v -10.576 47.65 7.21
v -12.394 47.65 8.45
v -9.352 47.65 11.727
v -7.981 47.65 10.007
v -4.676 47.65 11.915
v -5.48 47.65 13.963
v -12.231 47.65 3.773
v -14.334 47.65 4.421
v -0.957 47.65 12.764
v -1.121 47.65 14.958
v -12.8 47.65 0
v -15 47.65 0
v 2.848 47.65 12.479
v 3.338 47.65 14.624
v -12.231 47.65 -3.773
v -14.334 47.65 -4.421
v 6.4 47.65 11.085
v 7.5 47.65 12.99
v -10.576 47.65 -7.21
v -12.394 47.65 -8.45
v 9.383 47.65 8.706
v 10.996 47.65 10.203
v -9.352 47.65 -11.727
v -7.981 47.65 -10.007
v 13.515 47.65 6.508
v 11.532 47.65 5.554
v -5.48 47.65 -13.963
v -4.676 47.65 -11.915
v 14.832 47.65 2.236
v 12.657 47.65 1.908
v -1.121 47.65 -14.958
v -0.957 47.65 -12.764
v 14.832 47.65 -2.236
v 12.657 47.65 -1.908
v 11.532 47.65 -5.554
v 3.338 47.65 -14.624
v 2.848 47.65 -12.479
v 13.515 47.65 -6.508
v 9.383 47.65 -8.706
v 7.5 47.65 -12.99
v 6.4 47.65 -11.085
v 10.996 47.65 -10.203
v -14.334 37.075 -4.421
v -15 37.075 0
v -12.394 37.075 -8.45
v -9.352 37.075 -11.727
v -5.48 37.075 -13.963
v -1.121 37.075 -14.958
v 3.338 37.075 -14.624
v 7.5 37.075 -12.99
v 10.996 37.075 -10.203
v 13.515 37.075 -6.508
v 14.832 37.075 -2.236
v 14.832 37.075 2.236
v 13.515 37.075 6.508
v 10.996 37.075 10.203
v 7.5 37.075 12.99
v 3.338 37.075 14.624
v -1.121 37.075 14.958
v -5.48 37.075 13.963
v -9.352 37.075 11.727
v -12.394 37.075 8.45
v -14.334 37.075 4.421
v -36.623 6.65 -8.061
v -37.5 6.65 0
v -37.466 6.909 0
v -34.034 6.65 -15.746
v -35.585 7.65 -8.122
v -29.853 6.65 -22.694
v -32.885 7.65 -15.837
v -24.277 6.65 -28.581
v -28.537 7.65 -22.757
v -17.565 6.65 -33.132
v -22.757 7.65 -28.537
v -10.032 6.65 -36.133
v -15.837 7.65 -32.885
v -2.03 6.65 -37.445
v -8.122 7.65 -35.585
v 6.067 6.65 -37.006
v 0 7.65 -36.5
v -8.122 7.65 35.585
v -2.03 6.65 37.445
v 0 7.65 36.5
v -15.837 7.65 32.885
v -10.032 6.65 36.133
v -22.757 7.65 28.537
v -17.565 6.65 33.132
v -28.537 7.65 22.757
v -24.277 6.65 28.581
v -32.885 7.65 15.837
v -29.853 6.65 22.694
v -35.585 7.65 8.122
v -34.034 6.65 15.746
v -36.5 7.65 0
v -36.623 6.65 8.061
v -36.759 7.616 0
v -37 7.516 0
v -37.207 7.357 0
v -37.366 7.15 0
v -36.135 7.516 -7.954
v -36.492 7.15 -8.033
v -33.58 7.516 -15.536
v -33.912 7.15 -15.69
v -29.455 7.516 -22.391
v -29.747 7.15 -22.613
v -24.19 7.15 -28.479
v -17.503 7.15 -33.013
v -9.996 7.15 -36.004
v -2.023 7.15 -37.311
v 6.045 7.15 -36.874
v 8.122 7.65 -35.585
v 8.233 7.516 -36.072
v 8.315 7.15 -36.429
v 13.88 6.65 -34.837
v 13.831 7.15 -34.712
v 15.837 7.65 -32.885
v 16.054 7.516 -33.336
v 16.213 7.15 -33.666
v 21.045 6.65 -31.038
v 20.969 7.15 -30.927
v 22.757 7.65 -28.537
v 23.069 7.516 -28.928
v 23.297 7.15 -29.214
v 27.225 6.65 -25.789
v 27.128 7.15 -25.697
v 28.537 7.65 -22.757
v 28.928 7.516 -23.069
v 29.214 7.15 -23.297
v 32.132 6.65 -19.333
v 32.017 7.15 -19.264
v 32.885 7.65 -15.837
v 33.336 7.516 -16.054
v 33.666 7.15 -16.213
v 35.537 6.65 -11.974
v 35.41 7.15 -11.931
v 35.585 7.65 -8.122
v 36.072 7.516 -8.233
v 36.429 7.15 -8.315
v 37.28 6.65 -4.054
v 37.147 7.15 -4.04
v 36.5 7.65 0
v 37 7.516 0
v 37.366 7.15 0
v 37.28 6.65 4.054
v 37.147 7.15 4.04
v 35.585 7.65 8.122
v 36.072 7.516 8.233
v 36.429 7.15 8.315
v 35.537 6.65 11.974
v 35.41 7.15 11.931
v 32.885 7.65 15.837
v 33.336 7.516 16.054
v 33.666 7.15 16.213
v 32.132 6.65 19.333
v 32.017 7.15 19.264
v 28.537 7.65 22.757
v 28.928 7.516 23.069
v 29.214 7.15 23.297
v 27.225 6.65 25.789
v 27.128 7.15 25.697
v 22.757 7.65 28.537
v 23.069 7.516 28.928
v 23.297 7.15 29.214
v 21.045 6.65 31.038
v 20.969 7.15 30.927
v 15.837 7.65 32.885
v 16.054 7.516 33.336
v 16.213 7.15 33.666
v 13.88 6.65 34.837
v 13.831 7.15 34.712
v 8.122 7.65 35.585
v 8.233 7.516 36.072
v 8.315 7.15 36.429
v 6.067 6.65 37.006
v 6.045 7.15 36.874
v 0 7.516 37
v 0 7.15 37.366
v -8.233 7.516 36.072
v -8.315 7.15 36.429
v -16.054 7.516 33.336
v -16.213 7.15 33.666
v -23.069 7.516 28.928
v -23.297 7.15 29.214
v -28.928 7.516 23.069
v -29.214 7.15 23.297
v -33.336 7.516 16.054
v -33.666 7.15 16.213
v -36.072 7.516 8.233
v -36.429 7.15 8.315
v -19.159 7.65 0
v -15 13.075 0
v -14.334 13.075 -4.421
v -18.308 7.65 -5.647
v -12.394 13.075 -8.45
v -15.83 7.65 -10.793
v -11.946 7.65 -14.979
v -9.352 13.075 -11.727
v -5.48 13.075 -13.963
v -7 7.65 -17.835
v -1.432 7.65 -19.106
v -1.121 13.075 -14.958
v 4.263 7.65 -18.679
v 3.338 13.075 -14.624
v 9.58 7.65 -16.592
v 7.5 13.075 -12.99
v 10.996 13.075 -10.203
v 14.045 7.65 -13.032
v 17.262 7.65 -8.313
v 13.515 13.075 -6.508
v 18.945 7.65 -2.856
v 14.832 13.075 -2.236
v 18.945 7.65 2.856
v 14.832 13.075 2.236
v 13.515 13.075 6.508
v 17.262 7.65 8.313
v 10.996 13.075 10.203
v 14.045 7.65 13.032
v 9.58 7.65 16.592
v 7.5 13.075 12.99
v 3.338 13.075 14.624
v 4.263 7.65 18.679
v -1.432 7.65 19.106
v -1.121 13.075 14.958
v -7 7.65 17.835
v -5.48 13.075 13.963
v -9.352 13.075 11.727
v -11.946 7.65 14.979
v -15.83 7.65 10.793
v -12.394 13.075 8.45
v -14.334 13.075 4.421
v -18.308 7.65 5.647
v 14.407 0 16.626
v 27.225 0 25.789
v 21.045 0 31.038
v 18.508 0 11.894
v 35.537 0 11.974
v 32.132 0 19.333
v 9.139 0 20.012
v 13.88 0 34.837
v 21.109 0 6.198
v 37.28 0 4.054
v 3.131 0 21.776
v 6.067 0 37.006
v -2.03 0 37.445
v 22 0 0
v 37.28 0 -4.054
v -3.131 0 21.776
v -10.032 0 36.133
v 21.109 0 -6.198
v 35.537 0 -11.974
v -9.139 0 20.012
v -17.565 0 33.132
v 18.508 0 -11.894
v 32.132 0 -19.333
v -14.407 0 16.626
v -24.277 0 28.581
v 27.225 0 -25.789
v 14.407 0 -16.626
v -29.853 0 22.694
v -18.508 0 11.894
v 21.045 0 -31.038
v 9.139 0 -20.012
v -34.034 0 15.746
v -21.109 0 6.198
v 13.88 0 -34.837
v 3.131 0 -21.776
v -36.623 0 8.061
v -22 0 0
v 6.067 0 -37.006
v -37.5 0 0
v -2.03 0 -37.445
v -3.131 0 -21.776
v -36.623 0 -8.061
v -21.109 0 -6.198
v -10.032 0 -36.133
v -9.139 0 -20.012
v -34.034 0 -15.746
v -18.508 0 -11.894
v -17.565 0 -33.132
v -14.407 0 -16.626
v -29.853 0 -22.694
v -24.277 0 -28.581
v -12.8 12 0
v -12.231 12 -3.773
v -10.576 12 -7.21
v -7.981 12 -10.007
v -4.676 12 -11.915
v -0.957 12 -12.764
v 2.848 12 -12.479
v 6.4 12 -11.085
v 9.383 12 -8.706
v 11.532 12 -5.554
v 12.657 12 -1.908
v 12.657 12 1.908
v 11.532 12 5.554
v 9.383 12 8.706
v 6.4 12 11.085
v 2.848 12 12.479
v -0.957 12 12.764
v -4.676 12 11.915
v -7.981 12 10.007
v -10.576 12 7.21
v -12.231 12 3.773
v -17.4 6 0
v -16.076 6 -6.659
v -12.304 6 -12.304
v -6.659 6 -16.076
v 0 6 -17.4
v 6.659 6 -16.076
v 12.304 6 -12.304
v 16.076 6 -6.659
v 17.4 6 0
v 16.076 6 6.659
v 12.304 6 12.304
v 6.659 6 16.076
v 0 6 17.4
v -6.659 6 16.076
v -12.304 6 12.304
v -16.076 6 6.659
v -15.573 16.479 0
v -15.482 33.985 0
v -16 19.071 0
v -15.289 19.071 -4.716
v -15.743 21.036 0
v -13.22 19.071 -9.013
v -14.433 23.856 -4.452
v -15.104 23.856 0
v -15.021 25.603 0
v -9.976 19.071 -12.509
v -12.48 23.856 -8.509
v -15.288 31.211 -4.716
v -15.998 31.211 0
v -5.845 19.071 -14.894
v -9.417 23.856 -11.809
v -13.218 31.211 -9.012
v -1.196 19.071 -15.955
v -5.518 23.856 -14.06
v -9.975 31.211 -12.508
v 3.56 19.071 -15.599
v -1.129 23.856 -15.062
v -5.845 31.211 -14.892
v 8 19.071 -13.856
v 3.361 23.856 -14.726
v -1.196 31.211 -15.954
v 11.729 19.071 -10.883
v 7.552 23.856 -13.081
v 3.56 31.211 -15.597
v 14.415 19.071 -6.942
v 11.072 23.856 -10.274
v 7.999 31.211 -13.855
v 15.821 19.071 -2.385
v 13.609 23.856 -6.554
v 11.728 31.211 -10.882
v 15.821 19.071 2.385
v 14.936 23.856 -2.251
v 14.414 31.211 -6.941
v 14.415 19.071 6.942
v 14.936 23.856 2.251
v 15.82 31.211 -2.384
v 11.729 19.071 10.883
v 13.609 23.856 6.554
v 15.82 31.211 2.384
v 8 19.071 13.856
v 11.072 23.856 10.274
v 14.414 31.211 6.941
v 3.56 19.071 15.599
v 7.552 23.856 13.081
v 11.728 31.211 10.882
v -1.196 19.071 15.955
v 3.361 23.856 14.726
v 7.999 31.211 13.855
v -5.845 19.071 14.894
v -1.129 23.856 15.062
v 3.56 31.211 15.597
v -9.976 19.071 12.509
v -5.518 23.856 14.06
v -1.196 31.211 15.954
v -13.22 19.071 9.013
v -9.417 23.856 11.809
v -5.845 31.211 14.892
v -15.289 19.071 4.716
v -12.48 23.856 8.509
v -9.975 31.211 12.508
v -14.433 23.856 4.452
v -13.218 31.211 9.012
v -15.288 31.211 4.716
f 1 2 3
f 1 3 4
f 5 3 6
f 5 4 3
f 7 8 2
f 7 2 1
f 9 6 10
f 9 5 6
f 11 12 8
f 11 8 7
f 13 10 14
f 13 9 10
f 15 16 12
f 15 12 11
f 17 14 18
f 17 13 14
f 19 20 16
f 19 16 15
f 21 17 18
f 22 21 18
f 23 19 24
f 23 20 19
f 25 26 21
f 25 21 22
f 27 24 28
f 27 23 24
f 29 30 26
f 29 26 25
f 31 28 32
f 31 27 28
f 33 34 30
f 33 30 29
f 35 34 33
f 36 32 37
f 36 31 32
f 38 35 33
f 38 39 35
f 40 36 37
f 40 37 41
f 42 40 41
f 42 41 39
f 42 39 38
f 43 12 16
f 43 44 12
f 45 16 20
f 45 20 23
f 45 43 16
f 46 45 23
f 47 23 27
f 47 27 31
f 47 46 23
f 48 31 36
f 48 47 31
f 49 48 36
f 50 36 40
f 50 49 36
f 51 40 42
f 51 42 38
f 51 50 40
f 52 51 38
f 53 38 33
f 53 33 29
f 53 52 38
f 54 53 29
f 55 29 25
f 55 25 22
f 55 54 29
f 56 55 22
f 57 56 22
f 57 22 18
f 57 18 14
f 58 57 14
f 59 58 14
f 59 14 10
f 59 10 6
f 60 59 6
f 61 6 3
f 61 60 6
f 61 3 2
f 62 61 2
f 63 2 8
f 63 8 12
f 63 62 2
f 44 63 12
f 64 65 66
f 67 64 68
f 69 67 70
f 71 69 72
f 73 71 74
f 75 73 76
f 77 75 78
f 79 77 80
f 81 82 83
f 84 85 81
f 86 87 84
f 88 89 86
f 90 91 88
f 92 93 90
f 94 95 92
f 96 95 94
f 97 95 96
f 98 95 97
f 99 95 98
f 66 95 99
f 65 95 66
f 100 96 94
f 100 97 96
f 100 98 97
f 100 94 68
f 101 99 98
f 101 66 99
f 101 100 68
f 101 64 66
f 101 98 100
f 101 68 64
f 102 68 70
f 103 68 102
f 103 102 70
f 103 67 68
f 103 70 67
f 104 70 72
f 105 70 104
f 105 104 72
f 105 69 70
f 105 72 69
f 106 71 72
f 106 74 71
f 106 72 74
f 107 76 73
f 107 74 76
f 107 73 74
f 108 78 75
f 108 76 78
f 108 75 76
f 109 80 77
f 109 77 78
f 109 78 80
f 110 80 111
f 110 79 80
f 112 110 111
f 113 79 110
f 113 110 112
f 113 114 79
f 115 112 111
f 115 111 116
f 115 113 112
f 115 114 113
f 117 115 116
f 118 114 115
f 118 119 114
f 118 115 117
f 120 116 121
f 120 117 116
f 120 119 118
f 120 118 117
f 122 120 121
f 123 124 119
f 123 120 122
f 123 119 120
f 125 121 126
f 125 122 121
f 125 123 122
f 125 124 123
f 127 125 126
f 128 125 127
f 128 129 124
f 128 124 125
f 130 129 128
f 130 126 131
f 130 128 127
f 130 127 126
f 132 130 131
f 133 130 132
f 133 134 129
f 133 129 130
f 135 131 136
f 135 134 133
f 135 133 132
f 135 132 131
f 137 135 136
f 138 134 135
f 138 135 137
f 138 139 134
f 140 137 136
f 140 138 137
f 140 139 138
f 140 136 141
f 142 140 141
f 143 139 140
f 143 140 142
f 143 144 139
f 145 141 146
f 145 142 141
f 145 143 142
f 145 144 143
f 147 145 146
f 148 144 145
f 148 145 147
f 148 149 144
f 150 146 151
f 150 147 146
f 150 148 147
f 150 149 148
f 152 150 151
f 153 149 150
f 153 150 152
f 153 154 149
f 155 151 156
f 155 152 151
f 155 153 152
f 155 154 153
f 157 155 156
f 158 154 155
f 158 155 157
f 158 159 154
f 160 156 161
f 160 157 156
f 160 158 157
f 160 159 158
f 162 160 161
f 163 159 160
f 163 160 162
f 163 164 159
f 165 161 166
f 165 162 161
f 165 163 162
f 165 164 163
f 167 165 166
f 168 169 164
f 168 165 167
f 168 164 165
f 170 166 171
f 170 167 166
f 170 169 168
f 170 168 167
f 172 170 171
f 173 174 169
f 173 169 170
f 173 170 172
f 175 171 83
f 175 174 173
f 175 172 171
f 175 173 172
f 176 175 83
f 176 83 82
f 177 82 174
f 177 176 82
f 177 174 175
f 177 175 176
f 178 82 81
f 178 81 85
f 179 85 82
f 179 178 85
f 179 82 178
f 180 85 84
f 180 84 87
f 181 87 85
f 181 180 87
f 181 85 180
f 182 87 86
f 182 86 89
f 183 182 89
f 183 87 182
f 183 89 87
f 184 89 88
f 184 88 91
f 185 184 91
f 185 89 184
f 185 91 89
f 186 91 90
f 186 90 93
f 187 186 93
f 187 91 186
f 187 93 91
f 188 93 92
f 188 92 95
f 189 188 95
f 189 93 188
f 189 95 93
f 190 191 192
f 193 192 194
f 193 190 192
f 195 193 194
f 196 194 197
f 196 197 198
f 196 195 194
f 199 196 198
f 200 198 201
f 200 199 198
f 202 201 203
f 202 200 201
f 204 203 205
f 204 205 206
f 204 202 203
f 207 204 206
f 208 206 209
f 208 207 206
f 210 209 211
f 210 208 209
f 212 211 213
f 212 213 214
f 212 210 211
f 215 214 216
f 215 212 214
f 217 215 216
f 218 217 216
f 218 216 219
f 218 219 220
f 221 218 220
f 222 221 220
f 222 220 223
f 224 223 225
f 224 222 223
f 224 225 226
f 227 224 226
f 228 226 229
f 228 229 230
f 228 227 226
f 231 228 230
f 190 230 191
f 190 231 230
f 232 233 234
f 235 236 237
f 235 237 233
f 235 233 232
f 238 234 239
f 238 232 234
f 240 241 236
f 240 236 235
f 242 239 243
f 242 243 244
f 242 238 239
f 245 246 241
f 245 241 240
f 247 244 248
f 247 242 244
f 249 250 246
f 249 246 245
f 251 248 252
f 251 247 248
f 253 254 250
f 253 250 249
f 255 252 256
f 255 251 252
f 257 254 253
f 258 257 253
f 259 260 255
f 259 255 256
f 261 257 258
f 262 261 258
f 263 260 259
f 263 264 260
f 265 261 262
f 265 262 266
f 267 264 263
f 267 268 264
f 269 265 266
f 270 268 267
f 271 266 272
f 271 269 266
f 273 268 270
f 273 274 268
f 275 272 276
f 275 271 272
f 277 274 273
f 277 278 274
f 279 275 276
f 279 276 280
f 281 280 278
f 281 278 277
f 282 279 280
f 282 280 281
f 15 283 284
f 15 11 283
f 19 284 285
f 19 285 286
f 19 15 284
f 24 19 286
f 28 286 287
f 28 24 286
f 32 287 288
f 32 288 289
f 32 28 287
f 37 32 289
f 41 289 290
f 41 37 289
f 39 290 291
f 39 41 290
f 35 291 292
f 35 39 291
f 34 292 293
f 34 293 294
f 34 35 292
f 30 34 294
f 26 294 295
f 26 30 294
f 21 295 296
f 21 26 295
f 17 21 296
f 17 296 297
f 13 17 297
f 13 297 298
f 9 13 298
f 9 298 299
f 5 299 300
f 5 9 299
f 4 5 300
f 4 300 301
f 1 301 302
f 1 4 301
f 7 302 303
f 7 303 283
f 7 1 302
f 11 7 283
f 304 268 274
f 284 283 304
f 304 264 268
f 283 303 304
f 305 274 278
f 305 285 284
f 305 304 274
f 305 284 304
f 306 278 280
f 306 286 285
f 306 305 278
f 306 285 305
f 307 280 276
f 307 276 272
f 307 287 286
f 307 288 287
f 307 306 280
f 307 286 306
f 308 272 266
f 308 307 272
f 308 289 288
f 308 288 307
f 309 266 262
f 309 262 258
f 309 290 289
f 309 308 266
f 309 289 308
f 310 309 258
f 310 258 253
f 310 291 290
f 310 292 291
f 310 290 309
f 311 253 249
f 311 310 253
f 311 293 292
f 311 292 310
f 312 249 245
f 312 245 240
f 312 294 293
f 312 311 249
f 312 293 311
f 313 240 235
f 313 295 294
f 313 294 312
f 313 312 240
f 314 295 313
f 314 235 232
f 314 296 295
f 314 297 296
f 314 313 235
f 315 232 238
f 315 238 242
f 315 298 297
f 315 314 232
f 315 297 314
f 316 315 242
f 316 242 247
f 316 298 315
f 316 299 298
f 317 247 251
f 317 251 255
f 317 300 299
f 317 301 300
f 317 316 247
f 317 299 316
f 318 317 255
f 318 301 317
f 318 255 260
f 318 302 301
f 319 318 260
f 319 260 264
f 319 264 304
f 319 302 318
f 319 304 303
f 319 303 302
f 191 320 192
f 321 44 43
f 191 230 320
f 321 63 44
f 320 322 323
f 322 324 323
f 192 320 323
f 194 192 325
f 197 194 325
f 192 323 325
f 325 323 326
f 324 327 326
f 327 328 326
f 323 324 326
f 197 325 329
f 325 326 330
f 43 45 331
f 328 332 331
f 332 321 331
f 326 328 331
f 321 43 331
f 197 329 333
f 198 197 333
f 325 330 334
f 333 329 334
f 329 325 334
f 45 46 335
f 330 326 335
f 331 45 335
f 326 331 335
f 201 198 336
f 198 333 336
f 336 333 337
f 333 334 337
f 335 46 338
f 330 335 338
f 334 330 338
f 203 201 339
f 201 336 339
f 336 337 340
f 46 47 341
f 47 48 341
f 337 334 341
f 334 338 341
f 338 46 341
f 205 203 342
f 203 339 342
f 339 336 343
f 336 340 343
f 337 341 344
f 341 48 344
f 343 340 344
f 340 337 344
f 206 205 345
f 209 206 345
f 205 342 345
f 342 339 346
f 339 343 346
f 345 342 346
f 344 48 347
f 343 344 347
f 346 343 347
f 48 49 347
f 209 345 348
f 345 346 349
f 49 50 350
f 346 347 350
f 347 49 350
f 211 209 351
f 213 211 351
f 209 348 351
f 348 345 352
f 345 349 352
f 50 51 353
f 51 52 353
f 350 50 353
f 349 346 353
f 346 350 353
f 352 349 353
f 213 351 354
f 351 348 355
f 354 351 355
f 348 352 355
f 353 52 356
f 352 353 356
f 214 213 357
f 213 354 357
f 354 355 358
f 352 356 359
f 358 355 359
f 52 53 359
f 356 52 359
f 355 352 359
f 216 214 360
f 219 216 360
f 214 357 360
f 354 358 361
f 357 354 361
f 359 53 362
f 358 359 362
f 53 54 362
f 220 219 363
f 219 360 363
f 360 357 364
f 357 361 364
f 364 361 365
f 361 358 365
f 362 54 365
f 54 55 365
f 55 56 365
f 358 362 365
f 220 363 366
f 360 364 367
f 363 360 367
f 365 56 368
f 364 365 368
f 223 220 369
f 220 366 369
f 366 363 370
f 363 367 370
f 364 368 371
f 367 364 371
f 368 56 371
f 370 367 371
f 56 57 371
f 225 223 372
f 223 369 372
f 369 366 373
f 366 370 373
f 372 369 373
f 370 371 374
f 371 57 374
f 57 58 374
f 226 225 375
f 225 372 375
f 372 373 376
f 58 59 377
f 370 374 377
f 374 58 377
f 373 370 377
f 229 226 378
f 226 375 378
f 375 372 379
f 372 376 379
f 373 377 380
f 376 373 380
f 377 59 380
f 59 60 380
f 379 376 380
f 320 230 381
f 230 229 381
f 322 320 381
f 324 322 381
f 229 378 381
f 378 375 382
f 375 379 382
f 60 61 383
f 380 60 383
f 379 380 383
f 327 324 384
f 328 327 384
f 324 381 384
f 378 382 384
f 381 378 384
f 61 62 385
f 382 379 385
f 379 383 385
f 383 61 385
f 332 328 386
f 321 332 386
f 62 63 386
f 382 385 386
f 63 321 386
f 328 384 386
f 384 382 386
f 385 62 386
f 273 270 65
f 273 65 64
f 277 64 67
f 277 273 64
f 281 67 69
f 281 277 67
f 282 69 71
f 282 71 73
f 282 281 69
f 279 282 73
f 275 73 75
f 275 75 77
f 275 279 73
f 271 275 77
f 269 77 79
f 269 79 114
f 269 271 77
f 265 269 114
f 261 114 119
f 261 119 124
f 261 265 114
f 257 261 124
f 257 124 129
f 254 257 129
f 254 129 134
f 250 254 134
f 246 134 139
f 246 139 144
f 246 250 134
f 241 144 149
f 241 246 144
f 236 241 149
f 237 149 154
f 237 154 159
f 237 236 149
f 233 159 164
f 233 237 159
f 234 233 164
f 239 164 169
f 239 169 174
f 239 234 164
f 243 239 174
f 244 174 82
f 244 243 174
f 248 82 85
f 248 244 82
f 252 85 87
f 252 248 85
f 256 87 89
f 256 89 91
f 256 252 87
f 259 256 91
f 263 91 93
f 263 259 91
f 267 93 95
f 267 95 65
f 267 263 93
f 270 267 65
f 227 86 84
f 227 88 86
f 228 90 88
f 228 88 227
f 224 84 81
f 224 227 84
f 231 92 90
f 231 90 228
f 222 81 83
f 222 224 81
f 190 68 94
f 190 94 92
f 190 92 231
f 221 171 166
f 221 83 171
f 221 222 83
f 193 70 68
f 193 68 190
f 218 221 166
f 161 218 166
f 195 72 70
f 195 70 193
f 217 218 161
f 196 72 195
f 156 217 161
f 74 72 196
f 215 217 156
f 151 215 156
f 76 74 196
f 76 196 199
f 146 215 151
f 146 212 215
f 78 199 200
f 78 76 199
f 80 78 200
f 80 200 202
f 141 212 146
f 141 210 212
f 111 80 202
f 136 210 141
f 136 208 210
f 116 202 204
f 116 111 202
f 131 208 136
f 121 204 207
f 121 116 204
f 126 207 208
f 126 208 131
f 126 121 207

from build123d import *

# Parameters (mm, degrees)
F2_R = 1


with BuildPart() as f1:
    # F0 (on Top) → F1 (revolve)
    with BuildSketch(Plane.XY):
        with BuildLine():
            Line((-37.5, 0), (-22, 0))
            Line((-22, 0), (-12.8, 12))
            Line((-12.8, 12), (-12.8, 47.65))
            Line((-12.8, 47.65), (-15, 47.65))
            Line((-15, 47.65), (-15, 37.075003))
            add(Edge.make_bspline(
                [(-15, 13.075003), (-14.989024, 15.277), (-17.005096, 18.993094), (-13.998628, 25.058692), (-17.000392, 31.222159), (-15, 34.742516), (-15, 37.075003)],
                knots=[0, 0, 0, 0, 6.082763, 12.165525, 18.248288, 24.33105, 24.33105, 24.33105, 24.33105], degree=3))
            Line((-15, 13.075003), (-19.159169, 7.65))
            Line((-19.159169, 7.65), (-37.5, 7.65))
            Line((-37.5, 7.65), (-37.5, 0))
        make_face()
    revolve(axis=Axis((0, 6.605003, 0), (0, -1, 0)))

    # F2
    f2_edges = [f1.edges().sort_by_distance(p)[0] for p in [
        (37.5, 7.65, 0),
    ]]
    fillet(f2_edges, radius=F2_R)


solid = f1.part
